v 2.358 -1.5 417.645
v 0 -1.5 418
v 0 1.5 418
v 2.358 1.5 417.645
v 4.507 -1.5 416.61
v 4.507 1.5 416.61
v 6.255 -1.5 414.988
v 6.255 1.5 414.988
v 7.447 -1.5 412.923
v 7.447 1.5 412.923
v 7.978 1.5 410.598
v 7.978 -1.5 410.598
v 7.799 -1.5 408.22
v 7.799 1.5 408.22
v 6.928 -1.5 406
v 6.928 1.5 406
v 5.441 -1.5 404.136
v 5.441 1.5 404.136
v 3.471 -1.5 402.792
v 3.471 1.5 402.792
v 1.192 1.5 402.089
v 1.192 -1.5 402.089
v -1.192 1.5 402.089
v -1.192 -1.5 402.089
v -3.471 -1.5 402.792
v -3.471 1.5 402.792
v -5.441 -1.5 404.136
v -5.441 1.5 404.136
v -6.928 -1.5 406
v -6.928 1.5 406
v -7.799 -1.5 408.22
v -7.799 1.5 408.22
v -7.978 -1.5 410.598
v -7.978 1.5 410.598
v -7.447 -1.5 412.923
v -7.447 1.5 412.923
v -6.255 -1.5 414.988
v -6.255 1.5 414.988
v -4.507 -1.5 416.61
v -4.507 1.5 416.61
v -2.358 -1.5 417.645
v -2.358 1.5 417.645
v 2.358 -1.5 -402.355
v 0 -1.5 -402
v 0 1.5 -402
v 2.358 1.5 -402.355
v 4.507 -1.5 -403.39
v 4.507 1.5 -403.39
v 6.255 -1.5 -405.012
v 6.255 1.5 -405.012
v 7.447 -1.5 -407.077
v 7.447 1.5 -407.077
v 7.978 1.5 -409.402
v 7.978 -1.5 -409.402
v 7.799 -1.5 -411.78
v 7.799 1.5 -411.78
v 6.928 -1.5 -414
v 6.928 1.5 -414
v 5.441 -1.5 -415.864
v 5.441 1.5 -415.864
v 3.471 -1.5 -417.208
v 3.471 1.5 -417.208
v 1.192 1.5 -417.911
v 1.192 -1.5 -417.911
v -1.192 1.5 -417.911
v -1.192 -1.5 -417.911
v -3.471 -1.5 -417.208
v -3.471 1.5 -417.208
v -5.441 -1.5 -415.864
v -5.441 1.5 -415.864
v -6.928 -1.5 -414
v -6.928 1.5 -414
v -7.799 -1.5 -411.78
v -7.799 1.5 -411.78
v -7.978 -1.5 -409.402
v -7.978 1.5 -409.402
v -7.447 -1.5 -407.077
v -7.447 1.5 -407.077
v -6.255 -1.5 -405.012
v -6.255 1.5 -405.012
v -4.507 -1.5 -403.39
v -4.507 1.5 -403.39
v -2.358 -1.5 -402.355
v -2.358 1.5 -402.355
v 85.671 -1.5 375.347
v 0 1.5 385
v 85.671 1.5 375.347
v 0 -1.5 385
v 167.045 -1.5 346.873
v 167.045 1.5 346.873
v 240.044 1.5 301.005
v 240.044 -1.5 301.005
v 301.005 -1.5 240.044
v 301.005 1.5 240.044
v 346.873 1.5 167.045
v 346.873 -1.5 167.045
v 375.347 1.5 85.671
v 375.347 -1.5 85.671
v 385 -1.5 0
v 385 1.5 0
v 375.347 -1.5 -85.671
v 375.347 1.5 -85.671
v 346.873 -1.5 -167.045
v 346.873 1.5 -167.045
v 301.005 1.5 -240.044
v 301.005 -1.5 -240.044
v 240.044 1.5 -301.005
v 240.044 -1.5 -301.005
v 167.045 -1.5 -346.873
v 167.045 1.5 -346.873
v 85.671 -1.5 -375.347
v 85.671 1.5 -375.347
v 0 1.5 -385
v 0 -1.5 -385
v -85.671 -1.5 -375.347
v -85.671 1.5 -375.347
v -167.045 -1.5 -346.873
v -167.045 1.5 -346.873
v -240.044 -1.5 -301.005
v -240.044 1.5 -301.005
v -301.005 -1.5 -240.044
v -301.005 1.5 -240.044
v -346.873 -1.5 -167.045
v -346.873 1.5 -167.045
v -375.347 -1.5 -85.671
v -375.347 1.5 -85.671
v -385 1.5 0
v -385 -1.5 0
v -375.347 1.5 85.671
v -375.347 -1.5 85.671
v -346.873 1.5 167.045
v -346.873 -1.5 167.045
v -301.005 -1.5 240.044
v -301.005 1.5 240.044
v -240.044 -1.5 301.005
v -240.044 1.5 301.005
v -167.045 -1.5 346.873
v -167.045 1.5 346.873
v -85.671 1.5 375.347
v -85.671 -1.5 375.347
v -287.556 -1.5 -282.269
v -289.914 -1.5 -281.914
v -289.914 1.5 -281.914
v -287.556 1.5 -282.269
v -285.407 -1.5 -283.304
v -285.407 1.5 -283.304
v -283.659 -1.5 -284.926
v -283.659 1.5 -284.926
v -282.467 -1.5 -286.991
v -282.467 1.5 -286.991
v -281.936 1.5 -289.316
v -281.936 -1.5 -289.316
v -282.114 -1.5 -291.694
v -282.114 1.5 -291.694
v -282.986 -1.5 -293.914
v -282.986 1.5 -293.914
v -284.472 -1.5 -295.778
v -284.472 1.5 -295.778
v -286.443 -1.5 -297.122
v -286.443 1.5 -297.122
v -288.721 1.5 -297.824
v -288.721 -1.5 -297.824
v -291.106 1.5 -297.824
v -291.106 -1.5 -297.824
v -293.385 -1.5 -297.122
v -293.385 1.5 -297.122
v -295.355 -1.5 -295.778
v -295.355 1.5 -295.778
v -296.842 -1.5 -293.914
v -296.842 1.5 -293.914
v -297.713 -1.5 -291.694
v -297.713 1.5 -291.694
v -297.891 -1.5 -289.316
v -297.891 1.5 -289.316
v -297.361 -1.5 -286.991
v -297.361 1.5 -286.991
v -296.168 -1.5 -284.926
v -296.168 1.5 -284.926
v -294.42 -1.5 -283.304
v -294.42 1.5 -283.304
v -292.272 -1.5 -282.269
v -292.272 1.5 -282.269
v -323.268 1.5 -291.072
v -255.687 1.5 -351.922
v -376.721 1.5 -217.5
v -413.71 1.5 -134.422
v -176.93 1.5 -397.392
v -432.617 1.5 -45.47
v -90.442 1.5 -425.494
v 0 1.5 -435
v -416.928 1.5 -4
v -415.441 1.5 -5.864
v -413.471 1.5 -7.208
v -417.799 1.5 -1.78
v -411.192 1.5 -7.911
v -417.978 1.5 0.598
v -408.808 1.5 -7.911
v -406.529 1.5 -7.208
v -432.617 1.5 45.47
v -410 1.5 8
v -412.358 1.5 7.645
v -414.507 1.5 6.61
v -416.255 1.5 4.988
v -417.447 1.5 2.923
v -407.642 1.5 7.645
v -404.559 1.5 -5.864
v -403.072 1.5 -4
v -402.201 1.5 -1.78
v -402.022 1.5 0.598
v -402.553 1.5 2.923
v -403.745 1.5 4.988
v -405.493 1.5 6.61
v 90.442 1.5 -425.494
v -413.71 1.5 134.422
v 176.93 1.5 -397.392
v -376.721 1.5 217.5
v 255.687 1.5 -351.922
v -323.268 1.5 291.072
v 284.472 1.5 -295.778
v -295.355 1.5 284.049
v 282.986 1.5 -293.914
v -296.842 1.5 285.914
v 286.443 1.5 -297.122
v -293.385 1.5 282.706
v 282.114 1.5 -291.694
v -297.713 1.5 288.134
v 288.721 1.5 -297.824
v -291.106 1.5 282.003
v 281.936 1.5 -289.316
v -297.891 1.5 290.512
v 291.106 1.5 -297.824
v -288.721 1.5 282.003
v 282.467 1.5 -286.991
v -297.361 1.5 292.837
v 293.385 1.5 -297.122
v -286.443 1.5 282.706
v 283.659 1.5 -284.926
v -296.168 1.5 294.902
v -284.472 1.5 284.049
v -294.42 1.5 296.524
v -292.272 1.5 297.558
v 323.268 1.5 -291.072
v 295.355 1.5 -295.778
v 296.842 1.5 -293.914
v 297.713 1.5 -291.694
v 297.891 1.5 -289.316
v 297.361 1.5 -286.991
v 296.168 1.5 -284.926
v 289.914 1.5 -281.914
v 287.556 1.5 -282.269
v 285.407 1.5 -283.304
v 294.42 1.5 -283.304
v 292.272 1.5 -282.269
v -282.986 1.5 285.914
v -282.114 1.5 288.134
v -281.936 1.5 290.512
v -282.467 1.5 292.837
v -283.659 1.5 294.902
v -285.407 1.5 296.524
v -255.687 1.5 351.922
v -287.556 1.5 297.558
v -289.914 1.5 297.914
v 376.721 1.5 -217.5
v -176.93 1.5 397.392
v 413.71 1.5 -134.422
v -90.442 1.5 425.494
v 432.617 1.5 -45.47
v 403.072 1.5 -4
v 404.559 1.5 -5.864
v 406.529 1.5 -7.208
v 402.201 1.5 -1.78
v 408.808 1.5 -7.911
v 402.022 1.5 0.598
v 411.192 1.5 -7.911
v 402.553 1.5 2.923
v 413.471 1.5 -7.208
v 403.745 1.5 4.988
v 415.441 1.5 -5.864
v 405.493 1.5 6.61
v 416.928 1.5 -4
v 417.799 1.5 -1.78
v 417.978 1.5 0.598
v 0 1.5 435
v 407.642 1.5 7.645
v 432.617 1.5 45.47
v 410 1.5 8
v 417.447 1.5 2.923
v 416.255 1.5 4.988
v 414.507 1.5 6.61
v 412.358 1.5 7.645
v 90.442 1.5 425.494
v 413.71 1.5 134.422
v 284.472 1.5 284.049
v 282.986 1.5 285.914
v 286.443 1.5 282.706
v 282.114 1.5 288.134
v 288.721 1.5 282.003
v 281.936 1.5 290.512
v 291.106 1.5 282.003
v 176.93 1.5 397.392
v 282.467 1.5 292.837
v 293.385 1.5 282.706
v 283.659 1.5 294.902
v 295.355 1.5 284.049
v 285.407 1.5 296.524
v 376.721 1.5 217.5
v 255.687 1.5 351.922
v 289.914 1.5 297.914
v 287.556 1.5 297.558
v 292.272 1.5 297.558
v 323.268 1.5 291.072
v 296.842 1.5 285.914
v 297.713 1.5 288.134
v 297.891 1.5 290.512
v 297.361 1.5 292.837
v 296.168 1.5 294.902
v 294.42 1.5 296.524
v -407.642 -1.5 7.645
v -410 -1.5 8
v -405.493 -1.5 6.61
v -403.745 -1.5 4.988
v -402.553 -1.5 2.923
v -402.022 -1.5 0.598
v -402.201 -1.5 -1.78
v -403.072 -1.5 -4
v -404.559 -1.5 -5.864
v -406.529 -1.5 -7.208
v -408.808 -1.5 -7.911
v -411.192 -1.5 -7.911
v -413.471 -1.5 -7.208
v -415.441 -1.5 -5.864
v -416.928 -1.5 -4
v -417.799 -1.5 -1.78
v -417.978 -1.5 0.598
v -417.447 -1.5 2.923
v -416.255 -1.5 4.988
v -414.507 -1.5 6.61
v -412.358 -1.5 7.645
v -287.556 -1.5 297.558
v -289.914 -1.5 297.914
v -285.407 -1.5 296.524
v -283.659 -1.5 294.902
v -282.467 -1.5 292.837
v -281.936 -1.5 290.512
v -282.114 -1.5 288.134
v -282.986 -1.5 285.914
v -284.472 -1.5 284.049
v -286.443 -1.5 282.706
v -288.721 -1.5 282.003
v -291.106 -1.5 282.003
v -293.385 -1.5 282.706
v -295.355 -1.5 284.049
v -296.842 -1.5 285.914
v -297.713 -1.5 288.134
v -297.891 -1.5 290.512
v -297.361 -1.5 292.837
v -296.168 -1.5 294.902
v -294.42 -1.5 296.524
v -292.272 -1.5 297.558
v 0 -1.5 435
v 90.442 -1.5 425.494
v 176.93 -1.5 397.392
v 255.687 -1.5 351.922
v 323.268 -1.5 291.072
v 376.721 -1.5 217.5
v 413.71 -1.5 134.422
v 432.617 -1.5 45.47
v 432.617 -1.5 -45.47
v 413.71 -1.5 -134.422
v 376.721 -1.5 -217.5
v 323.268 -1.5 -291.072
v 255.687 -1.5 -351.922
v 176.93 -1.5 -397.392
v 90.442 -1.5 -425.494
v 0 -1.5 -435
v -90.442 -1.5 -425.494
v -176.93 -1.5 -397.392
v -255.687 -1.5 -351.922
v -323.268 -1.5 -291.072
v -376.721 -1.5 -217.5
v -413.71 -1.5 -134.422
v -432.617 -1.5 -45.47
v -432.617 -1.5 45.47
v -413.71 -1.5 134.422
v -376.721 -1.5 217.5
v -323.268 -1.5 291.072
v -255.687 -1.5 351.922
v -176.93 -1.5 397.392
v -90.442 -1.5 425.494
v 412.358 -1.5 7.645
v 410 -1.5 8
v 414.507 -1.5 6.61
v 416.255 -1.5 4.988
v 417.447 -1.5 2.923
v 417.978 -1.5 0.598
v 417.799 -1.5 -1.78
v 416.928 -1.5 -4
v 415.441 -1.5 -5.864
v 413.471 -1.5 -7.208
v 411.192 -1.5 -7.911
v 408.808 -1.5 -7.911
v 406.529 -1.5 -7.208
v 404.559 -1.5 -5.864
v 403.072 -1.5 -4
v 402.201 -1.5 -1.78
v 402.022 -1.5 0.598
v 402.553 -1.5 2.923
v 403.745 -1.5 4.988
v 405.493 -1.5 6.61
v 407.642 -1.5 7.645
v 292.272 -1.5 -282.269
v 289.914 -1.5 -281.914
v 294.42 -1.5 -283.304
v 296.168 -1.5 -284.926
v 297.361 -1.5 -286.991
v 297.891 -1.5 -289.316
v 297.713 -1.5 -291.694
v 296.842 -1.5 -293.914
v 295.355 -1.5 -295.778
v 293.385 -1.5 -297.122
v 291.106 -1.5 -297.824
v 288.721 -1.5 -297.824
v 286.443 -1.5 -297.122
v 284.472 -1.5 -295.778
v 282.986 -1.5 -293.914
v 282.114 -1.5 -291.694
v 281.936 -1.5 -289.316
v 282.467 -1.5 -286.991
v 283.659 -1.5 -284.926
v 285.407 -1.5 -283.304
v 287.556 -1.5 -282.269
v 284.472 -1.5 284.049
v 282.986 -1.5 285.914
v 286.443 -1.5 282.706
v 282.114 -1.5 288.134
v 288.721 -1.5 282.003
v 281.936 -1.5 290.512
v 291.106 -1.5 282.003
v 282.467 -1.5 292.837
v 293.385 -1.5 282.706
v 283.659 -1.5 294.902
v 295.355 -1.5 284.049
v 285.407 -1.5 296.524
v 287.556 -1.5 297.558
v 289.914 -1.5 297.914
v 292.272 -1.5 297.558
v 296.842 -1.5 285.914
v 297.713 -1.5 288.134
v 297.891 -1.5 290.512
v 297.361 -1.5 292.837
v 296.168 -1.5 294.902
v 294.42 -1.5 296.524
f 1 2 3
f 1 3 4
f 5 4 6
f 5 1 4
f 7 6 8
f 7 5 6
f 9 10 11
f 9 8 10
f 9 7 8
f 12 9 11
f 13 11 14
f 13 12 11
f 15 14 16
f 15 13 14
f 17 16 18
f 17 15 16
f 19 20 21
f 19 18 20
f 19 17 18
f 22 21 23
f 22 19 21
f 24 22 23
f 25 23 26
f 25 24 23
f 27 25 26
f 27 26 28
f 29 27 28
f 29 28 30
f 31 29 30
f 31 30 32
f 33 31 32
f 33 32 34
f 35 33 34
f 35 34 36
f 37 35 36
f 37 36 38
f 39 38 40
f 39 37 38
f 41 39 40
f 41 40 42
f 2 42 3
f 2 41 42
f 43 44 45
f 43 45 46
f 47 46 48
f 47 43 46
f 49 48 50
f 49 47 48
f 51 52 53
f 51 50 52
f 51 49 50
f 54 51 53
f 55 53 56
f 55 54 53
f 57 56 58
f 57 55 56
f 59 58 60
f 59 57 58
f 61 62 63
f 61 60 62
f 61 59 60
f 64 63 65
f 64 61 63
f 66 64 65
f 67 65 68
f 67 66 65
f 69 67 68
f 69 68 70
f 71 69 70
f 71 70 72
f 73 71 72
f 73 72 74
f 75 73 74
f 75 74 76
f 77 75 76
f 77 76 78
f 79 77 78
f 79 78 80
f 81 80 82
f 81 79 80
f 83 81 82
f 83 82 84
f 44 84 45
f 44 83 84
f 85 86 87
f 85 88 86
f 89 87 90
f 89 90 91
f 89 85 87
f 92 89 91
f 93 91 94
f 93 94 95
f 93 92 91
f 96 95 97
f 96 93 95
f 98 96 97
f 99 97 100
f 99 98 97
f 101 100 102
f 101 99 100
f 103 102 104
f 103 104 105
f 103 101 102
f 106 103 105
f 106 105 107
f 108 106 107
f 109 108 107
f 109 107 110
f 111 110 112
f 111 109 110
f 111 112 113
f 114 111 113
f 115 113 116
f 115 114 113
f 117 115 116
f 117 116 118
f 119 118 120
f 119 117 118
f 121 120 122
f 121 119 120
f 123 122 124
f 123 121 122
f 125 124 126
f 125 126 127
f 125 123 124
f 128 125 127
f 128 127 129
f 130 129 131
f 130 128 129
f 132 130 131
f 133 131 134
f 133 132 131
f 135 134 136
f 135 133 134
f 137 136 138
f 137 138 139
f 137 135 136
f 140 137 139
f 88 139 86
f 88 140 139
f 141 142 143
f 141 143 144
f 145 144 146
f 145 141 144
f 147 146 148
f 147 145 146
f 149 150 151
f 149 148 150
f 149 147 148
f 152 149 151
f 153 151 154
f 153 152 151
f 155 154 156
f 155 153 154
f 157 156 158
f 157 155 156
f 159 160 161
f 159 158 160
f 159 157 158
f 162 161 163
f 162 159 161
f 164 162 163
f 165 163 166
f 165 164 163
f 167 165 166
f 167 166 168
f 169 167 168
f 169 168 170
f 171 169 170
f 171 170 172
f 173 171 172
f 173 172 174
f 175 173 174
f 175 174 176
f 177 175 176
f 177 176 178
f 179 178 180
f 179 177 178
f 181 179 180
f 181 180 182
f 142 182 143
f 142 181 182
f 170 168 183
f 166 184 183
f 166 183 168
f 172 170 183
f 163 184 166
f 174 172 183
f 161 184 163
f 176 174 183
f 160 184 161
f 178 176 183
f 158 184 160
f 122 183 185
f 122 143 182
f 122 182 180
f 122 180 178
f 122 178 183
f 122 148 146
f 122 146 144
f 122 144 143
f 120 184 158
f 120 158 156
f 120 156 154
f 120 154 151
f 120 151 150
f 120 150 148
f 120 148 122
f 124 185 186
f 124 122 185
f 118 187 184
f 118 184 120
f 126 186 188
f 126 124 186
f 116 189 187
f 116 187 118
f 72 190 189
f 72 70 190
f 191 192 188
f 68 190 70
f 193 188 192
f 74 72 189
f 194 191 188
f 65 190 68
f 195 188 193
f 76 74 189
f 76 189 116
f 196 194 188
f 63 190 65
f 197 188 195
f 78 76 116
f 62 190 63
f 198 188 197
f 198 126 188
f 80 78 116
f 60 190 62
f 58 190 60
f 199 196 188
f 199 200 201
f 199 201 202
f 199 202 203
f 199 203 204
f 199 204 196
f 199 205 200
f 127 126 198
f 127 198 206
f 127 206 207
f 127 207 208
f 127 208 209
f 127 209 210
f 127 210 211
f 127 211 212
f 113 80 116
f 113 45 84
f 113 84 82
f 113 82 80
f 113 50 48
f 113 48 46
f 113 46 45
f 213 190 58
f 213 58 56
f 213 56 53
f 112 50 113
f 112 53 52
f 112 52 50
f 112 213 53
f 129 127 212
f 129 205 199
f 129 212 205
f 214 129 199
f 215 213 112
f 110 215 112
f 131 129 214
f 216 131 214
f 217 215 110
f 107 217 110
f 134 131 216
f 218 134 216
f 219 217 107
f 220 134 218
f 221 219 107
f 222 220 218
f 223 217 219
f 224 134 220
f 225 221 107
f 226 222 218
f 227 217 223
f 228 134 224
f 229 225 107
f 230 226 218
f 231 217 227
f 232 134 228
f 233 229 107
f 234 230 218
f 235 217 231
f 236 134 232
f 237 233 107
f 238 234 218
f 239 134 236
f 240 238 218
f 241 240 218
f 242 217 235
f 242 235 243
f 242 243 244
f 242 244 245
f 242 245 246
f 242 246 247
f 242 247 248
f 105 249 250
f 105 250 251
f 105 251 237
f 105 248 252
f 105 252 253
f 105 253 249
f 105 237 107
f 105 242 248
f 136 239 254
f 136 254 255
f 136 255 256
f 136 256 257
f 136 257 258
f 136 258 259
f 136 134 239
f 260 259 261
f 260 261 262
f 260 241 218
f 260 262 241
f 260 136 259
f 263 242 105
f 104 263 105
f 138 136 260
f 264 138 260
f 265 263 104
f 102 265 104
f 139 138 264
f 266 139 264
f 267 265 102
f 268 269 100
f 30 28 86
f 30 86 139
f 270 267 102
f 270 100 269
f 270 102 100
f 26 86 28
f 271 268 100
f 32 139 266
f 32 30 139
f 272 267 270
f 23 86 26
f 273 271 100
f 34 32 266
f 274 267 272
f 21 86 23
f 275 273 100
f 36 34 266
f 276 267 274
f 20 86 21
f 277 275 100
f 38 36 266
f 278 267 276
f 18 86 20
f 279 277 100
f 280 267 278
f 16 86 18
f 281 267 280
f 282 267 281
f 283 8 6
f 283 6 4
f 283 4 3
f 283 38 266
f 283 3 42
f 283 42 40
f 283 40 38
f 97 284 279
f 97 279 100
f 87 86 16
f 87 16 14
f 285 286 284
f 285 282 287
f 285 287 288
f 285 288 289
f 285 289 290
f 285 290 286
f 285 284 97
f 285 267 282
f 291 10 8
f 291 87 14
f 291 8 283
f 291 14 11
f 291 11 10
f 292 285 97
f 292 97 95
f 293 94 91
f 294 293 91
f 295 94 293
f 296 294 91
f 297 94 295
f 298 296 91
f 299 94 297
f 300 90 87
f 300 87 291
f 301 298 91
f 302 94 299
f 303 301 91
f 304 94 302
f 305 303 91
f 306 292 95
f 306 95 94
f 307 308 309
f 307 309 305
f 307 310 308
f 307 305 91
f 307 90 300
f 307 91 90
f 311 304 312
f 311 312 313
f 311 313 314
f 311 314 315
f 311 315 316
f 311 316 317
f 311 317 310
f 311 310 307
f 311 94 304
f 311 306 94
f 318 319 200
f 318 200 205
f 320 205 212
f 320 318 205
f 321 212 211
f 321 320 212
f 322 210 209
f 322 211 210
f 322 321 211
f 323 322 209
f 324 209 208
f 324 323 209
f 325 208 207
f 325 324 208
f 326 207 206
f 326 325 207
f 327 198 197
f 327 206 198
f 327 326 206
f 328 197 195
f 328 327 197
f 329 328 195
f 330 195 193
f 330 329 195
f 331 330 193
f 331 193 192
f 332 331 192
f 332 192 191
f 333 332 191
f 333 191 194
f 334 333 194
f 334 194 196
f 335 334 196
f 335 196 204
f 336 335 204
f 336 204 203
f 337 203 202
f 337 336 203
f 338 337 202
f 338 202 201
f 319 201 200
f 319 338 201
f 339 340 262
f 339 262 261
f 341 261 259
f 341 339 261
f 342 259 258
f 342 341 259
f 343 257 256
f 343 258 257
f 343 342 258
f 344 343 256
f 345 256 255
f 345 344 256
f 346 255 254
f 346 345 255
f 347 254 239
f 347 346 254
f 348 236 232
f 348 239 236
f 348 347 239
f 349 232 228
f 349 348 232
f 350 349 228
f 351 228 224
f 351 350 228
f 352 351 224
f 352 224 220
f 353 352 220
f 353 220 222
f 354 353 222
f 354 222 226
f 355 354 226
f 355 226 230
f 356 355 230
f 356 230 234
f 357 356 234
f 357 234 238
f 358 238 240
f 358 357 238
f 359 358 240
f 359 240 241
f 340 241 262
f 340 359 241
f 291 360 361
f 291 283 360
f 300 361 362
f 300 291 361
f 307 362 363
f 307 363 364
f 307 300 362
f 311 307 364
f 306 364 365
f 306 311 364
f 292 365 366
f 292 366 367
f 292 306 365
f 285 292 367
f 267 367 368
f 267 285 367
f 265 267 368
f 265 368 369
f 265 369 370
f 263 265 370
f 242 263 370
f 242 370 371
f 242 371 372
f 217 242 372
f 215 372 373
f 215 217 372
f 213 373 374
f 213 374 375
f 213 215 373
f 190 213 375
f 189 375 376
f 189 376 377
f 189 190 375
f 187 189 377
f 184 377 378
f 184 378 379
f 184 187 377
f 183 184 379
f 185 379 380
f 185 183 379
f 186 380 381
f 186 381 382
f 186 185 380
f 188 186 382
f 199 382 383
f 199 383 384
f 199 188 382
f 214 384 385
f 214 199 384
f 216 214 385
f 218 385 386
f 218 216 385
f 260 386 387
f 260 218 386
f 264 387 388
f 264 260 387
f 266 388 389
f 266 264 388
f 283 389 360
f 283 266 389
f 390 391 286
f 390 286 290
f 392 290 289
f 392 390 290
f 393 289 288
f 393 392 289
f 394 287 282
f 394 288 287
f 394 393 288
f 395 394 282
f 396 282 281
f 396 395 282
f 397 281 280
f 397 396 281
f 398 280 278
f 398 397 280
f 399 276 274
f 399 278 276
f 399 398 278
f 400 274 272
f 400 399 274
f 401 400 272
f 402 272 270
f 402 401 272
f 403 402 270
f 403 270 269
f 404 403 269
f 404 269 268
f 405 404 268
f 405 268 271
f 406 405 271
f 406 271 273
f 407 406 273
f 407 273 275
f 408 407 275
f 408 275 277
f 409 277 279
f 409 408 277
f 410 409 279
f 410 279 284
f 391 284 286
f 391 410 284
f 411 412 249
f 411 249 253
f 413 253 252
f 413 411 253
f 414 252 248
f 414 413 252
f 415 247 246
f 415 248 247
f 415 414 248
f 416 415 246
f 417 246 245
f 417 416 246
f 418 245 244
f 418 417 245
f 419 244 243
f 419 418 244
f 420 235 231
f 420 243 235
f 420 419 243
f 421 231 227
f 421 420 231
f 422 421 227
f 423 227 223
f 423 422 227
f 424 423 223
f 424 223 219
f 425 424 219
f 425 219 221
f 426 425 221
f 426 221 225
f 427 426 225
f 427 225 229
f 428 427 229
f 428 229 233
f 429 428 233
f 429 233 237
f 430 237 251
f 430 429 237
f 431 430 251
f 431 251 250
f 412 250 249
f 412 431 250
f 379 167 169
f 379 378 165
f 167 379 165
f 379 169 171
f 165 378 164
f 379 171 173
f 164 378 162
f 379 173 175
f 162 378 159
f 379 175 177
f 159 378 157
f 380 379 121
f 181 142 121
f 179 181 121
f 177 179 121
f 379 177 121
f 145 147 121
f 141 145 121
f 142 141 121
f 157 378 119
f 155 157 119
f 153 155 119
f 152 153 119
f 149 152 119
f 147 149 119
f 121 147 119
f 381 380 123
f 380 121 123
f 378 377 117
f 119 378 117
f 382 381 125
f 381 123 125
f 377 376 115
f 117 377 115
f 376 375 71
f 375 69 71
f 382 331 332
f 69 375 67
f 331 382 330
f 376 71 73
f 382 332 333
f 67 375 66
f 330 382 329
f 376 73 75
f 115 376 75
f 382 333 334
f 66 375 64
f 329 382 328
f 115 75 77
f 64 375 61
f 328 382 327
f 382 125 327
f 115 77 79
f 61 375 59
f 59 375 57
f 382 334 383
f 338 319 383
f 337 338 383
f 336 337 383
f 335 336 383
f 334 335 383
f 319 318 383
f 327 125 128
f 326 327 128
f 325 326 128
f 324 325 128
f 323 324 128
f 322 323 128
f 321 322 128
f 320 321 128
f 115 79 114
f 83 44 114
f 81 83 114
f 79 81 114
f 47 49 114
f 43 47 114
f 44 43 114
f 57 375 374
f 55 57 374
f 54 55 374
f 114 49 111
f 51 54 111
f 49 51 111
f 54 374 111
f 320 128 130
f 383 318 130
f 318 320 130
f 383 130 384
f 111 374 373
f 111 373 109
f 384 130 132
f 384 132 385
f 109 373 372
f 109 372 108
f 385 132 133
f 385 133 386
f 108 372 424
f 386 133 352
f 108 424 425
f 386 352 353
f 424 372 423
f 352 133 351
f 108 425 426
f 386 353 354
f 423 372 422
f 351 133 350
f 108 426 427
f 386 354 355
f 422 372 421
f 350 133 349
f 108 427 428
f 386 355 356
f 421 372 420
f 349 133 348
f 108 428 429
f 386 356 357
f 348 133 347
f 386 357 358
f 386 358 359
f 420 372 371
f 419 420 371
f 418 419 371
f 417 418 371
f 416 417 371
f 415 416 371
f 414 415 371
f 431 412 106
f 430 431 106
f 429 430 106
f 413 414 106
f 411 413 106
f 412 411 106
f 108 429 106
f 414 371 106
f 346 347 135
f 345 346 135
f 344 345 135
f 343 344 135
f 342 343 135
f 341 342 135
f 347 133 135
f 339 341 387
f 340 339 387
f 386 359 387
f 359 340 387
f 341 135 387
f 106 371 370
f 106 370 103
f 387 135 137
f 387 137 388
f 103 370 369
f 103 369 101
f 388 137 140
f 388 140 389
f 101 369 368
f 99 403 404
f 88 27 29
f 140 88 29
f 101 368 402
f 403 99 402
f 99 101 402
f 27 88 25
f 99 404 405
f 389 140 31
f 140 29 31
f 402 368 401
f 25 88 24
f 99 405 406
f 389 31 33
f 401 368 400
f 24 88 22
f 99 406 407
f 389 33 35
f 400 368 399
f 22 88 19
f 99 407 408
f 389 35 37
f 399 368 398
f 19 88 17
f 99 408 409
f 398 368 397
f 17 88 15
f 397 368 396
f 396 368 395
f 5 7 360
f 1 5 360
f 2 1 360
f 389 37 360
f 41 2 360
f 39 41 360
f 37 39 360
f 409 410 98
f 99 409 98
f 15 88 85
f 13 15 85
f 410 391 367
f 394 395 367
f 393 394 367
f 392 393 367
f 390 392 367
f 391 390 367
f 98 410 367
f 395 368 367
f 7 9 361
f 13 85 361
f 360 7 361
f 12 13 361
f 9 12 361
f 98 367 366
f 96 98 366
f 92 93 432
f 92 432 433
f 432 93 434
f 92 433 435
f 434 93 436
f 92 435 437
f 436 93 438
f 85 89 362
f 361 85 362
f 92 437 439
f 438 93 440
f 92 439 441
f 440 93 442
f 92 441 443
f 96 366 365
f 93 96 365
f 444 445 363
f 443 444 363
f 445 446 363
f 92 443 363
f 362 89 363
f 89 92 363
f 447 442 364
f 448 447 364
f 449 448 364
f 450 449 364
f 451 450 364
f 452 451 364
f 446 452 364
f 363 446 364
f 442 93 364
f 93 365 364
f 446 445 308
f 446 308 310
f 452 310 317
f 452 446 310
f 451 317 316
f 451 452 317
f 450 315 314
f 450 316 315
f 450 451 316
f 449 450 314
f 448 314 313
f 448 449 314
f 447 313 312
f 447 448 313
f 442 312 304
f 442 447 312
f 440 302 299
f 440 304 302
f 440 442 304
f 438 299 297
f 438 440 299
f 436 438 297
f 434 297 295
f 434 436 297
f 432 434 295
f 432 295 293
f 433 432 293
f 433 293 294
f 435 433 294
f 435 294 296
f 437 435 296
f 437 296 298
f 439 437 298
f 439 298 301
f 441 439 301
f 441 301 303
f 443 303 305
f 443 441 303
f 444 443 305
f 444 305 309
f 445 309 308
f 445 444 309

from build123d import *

# Parameters (mm, degrees)
SKETCH1_R               = 435
SKETCH1_R_2             = 385
BOSS_EXTRUDE1_DEPTH     = 1.5
CUT_EXTRUDE1_DEPTH      = 616.190214487
CUT_EXTRUDE1_DEPTH_BACK = 616.190214487
SKETCH2_R               = 8


with BuildPart() as part:
    # Sketch1 → Boss-Extrude1 (new, symmetric)
    with BuildSketch(Plane(origin=(0, 0, 0), x_dir=(1, 0, 0), z_dir=(0, 1, 0))):
        with Locations(Location((0, 0, 0), (0, 0, 270))):
            Circle(SKETCH1_R)
        with Locations(Location((0, 0, 0), (0, 0, 270))):
            Circle(SKETCH1_R_2, mode=Mode.SUBTRACT)
    extrude(amount=BOSS_EXTRUDE1_DEPTH, both=True)

    # Sketch2 → Cut-Extrude1 (cut, two sides: drawn at the far end of the back side and taken through both)
    with BuildSketch(Plane(origin=(0, 1.5, 0), x_dir=(1, 0, 0), z_dir=(0, 1, 0)).offset(-CUT_EXTRUDE1_DEPTH_BACK)):
        with Locations(Location((410, 0, 0), (0, 0, 270))):
            Circle(SKETCH2_R)
        with Locations(Location((289.913780286, -289.913780286, 0), (0, 0, 270))):
            Circle(SKETCH2_R)
        with Locations(Location((0, -410, 0), (0, 0, 270))):
            Circle(SKETCH2_R)
        with Locations(Location((-289.913780286, -289.913780286, 0), (0, 0, 270))):
            Circle(SKETCH2_R)
        with Locations(Location((-410, 0, 0), (0, 0, 270))):
            Circle(SKETCH2_R)
        with Locations(Location((-289.913780286, 289.913780286, 0), (0, 0, 270))):
            Circle(SKETCH2_R)
        with Locations(Location((0, 410, 0), (0, 0, 270))):
            Circle(SKETCH2_R)
        with Locations(Location((289.913780286, 289.913780286, 0), (0, 0, 270))):
            Circle(SKETCH2_R)
    extrude(amount=CUT_EXTRUDE1_DEPTH + CUT_EXTRUDE1_DEPTH_BACK, mode=Mode.SUBTRACT)


solid = part.part
